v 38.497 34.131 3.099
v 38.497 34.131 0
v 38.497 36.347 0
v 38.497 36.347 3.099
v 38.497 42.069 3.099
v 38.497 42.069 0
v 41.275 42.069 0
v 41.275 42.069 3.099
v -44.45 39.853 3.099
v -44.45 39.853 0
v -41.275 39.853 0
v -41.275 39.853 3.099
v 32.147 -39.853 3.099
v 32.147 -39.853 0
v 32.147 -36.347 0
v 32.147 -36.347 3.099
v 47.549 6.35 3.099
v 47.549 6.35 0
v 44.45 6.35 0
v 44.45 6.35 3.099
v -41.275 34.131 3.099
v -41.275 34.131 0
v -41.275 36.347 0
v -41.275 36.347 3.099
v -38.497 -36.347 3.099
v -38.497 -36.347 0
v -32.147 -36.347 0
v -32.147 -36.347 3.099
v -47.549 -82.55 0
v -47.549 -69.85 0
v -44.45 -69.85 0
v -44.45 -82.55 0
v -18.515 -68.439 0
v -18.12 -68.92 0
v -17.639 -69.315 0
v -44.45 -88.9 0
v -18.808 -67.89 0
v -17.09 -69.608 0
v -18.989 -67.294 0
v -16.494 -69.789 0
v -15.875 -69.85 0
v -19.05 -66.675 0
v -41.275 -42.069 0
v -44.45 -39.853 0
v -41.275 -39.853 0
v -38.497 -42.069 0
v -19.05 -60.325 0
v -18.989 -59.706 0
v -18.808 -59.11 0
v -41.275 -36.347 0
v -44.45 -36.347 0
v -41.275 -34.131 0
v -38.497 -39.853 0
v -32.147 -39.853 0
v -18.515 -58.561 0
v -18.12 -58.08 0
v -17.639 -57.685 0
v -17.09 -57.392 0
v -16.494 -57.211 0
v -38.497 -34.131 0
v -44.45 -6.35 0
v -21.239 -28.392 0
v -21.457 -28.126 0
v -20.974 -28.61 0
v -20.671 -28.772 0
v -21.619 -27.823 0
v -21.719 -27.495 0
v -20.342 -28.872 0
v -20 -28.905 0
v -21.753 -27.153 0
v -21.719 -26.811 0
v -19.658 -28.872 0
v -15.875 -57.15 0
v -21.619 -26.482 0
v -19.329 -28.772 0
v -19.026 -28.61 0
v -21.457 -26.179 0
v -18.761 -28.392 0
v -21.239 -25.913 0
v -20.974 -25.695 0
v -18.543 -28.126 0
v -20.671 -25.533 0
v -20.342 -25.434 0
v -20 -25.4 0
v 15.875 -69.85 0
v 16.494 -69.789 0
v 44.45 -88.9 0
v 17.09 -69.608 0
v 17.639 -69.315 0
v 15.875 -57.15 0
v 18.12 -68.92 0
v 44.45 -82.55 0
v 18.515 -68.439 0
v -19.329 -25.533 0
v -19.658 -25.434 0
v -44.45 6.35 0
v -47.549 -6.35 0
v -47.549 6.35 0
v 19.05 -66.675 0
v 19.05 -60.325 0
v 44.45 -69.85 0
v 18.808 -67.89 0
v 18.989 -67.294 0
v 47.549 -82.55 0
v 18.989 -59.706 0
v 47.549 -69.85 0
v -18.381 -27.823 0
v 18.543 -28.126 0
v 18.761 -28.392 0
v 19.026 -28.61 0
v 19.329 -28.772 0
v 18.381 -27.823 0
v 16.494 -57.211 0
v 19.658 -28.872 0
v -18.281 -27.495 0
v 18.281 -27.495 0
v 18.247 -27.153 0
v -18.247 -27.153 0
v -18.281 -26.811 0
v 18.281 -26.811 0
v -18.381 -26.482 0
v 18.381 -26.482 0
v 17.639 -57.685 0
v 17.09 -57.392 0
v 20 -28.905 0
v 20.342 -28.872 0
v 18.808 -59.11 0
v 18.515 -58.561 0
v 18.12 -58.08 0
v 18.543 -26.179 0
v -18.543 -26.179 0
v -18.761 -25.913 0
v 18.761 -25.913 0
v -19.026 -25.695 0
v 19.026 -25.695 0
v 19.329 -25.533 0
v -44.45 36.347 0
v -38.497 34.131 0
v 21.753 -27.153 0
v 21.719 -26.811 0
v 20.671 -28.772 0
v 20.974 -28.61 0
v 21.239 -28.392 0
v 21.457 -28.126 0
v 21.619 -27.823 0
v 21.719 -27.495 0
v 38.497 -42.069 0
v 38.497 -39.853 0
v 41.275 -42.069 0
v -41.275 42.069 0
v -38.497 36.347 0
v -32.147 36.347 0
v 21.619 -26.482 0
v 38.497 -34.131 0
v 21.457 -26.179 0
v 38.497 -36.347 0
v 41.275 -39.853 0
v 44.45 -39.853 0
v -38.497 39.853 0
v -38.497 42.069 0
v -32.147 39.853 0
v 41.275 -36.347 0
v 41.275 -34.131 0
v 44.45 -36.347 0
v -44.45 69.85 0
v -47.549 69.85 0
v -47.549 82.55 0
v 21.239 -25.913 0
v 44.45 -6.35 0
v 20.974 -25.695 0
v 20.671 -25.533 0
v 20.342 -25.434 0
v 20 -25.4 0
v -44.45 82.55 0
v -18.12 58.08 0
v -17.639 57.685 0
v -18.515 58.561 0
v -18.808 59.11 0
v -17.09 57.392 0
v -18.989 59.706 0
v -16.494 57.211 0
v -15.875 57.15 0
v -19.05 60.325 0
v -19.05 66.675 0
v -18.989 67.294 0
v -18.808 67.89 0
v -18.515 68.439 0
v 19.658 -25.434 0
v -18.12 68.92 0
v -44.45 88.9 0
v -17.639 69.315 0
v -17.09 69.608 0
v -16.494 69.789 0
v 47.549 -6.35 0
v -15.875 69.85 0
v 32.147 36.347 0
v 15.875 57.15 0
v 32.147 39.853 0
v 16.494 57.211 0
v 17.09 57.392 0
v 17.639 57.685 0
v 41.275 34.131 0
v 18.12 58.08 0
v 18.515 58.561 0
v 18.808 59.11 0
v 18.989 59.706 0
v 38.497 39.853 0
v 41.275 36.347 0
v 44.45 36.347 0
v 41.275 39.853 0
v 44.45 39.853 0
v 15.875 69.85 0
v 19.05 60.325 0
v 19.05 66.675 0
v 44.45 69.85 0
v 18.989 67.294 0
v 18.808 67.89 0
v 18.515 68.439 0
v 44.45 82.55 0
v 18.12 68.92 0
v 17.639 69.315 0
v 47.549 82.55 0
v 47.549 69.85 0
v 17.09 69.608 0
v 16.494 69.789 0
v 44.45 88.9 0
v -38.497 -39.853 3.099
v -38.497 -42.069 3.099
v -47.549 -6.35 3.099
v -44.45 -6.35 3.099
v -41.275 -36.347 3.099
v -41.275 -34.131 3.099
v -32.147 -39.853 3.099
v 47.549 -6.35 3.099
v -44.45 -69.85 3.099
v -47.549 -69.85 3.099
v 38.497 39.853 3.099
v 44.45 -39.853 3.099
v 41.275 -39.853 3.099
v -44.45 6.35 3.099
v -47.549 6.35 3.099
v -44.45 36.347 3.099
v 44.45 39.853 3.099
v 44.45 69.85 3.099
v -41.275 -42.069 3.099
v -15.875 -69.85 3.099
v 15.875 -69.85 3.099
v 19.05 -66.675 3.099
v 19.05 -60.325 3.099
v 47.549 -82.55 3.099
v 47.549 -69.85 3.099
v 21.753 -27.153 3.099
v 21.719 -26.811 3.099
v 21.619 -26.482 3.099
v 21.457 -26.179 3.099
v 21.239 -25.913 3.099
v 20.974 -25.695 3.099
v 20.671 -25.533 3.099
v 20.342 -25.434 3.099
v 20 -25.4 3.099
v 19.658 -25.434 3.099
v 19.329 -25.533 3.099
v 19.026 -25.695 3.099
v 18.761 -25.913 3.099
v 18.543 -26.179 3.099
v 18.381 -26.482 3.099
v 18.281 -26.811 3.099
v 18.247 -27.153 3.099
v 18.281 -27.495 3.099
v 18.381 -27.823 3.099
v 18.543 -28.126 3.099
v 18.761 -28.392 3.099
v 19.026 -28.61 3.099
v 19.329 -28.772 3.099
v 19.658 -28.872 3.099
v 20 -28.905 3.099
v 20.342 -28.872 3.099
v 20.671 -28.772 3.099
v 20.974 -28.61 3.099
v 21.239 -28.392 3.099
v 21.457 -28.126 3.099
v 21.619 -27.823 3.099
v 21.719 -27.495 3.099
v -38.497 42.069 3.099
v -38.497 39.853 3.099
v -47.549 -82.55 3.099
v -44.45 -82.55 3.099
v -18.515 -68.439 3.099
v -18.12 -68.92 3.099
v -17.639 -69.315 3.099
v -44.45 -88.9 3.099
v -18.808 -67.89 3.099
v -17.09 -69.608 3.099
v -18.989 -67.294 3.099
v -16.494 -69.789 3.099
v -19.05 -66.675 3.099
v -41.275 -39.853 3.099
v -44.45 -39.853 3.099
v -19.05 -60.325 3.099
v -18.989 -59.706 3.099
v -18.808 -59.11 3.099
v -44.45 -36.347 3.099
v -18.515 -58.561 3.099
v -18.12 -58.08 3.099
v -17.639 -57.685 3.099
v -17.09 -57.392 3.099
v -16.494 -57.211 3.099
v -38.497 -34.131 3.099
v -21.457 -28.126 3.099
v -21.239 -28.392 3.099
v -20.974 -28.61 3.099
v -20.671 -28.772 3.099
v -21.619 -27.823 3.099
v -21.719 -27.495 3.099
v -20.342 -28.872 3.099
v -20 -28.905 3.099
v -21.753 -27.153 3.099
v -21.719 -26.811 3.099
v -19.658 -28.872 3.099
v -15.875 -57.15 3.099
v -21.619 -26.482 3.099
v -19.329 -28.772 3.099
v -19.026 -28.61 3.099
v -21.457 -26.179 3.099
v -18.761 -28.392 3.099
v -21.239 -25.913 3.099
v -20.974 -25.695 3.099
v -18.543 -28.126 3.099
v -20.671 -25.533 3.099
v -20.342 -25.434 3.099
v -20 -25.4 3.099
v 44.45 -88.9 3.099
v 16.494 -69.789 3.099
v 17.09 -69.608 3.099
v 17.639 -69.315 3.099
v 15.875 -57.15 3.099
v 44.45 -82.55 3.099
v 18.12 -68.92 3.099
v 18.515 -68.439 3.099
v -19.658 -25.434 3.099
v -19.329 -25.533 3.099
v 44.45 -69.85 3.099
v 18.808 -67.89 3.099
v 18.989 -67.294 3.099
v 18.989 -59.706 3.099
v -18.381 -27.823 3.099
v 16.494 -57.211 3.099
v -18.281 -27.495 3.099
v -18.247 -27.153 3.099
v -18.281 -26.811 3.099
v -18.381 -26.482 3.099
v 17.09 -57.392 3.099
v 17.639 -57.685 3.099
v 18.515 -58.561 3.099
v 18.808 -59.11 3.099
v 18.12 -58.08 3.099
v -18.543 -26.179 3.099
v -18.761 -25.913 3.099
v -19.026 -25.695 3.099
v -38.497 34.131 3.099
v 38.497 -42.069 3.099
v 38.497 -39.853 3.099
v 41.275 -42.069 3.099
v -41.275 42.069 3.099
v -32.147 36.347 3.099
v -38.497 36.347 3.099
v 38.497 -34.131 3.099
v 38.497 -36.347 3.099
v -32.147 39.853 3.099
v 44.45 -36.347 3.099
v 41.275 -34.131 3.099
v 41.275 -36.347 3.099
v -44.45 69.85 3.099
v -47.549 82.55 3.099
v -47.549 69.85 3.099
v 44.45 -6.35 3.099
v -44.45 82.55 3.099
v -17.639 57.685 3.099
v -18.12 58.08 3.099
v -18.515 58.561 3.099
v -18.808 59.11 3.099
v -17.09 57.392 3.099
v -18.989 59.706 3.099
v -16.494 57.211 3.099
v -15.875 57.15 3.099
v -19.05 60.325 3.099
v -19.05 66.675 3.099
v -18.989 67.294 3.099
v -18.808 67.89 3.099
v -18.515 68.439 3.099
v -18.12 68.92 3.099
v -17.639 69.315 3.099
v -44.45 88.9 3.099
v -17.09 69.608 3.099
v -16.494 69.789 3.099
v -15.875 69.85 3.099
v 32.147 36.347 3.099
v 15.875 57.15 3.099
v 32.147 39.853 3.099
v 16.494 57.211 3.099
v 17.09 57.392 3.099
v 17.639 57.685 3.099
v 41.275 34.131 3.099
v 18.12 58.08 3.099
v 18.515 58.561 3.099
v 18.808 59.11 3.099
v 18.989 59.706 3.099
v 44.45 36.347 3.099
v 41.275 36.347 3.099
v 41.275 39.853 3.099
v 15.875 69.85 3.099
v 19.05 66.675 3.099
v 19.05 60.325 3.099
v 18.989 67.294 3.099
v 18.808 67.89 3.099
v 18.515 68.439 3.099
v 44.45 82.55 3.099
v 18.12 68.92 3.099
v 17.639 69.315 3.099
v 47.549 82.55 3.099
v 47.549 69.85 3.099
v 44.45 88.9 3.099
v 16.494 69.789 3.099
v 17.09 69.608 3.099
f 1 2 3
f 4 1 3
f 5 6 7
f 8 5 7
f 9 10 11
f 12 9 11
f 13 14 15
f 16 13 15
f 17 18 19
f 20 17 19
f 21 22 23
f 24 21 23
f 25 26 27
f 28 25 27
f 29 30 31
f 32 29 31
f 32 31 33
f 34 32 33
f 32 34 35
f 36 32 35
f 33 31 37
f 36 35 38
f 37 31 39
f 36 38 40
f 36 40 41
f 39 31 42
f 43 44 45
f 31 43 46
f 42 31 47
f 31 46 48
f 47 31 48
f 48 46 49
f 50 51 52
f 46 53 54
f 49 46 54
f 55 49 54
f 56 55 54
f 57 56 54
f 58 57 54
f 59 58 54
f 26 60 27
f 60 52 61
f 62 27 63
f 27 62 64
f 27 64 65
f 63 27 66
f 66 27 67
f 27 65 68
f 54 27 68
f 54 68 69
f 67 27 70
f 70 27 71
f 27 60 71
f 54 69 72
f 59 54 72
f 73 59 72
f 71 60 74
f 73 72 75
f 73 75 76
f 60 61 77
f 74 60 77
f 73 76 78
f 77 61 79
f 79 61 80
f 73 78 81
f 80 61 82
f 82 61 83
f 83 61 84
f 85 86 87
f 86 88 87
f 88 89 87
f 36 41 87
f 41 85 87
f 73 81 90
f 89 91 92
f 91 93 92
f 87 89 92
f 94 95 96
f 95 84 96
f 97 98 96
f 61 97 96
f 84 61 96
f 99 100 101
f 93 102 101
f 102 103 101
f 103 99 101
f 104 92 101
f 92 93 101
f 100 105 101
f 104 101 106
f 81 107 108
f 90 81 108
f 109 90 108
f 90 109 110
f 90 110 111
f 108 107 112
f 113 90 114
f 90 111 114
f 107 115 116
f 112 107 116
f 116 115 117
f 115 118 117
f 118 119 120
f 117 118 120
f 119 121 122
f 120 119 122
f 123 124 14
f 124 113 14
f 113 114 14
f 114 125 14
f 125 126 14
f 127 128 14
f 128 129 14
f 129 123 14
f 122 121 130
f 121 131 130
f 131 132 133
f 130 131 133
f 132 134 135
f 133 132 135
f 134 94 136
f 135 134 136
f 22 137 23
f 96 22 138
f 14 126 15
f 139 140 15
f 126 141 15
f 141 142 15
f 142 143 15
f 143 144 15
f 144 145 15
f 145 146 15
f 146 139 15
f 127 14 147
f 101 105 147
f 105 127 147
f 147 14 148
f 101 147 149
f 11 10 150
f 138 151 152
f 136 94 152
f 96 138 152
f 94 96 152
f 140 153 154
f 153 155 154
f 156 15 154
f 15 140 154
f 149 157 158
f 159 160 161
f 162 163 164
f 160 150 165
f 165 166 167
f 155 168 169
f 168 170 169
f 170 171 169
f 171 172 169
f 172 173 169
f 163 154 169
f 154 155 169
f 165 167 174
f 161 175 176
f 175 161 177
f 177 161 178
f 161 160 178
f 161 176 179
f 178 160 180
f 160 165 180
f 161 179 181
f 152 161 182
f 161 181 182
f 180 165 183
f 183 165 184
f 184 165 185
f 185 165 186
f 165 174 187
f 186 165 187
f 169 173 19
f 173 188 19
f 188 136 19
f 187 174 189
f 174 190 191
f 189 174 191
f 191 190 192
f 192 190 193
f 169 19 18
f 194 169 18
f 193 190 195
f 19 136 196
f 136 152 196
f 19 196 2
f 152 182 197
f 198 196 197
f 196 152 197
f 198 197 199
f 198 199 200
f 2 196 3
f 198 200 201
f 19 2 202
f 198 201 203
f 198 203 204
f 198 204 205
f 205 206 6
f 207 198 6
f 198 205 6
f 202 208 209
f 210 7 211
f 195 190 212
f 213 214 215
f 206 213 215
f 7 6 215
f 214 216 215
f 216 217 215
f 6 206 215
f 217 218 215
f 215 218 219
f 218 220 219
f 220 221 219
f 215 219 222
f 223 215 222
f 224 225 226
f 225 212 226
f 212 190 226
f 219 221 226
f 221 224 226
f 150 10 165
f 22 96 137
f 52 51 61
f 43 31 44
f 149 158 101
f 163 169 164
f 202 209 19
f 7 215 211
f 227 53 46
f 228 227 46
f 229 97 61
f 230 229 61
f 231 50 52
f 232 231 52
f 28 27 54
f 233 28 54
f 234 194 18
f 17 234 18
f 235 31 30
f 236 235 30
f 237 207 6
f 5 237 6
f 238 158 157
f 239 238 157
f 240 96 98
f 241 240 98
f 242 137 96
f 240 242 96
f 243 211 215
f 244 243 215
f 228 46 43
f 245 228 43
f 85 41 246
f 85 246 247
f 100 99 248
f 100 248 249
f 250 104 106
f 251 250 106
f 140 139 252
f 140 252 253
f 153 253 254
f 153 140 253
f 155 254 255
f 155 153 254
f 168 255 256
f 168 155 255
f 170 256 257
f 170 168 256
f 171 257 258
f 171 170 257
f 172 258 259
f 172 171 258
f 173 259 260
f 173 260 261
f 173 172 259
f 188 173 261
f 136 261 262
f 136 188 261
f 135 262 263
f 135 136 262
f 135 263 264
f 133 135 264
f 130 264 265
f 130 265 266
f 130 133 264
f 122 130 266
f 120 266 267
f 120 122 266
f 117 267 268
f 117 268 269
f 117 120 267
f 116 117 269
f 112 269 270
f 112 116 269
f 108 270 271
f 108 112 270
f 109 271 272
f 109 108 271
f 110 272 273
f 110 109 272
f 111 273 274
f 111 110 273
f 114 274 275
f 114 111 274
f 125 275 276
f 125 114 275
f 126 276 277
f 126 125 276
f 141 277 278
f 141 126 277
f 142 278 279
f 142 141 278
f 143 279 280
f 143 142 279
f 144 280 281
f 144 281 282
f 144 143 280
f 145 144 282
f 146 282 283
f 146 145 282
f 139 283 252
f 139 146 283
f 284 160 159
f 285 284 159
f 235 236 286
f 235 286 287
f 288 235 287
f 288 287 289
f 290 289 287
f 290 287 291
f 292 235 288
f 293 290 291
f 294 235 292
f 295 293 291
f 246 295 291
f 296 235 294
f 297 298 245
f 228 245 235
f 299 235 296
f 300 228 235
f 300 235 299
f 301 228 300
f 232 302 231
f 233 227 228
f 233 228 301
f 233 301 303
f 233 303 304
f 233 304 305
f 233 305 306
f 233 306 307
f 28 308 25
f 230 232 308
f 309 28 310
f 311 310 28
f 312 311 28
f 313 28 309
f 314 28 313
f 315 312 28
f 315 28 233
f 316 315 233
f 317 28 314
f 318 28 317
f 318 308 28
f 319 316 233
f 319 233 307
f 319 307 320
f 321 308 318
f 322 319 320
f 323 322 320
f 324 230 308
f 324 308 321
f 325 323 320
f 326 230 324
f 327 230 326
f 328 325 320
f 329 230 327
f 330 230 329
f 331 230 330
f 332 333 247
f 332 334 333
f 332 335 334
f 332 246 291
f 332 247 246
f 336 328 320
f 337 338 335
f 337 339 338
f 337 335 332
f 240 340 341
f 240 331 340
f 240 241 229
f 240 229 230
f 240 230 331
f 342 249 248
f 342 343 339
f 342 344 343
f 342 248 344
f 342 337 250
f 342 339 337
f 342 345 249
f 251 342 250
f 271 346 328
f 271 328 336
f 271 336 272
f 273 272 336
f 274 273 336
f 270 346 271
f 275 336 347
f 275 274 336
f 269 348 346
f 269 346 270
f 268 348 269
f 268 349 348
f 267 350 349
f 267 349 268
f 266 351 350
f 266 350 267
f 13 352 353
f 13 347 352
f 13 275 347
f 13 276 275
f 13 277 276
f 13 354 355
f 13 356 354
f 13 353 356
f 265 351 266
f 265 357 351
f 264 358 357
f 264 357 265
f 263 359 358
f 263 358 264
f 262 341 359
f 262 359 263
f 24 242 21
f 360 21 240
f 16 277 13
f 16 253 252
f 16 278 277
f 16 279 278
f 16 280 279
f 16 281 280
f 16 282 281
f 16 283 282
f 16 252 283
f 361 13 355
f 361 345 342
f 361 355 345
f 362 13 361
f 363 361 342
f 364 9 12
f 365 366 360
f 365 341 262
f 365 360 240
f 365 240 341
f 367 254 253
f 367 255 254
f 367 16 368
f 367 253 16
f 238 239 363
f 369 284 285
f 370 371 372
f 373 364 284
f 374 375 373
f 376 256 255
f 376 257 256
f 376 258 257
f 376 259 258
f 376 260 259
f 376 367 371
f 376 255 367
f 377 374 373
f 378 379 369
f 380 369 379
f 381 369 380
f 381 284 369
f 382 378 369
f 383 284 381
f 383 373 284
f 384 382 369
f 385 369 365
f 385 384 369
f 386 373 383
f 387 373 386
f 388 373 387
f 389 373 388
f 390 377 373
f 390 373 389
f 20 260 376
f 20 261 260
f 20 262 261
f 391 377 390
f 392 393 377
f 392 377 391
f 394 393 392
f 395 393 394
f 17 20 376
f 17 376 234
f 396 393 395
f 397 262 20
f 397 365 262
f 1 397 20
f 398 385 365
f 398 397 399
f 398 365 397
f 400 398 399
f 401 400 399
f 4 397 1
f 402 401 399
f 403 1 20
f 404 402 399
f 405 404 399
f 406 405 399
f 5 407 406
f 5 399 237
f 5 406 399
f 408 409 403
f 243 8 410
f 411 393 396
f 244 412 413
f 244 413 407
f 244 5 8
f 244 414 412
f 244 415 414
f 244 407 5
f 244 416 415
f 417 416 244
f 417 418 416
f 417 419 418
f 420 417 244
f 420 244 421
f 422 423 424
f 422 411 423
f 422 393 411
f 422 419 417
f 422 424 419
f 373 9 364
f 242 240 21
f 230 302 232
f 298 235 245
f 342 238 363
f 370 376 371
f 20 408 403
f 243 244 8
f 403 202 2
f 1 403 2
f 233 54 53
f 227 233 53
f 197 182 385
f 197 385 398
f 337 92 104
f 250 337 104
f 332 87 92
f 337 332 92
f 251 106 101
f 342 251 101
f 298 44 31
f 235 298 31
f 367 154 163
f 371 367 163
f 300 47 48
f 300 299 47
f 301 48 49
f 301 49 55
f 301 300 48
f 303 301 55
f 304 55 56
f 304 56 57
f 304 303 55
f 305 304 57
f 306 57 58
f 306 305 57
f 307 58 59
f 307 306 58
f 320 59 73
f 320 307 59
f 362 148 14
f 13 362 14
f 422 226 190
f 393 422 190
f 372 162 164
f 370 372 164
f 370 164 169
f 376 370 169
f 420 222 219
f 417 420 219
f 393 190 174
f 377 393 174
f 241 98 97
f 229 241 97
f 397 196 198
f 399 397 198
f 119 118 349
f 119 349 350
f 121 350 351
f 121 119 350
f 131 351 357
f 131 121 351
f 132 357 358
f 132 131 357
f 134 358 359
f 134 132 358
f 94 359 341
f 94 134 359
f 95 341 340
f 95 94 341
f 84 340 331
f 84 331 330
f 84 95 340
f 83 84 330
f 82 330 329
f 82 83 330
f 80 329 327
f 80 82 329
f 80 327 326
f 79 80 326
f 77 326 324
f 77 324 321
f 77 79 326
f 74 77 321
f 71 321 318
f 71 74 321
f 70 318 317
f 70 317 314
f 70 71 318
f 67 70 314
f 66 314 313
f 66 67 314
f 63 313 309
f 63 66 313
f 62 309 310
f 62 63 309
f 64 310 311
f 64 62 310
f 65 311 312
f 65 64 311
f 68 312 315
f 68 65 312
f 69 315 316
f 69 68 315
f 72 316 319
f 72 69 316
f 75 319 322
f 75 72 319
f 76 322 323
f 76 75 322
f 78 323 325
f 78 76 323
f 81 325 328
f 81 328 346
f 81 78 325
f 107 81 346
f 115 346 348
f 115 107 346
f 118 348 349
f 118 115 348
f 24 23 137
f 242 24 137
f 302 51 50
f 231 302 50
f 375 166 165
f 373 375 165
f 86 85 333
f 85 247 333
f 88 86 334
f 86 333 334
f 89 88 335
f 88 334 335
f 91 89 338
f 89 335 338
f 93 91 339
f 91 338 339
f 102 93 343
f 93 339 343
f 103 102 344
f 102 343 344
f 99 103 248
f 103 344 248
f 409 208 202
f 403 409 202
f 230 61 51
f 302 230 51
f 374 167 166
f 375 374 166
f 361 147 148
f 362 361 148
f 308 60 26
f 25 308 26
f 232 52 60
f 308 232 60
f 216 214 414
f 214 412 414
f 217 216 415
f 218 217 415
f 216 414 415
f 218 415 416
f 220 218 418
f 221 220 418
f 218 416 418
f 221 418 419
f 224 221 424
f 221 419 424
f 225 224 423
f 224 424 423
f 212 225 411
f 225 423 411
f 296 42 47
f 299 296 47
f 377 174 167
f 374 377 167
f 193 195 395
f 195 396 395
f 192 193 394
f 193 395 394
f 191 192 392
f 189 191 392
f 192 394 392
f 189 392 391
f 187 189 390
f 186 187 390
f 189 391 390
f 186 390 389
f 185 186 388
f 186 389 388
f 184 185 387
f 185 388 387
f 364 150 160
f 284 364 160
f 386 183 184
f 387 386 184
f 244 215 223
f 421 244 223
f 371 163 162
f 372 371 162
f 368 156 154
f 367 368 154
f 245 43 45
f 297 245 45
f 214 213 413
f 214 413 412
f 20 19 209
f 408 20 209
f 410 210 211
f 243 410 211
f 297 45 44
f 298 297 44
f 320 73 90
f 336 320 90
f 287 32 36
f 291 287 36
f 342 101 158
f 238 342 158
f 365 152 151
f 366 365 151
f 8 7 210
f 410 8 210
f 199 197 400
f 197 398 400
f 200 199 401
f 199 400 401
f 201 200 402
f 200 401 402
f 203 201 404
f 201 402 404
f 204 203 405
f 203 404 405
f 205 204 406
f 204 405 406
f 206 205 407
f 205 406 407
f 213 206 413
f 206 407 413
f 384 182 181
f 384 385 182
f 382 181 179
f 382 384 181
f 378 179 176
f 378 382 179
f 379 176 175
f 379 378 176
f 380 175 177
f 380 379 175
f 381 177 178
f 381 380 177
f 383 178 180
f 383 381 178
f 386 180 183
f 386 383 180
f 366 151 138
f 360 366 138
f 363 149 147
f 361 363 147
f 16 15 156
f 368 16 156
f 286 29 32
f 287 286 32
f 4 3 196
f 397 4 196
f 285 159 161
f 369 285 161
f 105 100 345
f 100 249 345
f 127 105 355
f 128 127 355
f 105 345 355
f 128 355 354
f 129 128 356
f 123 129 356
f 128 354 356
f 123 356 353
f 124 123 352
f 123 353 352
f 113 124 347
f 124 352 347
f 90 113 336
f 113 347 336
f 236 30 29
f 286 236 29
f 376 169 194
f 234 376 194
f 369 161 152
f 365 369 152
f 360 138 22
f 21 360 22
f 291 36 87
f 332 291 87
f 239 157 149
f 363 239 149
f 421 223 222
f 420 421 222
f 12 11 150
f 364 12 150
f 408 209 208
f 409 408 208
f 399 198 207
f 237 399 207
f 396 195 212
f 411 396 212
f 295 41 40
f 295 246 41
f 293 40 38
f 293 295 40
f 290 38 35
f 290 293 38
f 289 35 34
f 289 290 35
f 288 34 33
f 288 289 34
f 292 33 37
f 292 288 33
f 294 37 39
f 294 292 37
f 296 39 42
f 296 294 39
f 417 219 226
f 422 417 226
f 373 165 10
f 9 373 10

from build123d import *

# Parameters (mm, degrees)
F0_R     = 1.7526
F0_W     = 38.1
F0_H     = 12.7
F1_DEPTH = 3.0988
F2_R     = 3.175


with BuildPart() as f1:
    # F0 (on Top) → F1 (new body)
    with BuildSketch(Plane.XY):
        Polygon((44.45, 88.9), (-44.45, 88.9), (-44.45, 82.55), (-47.5488, 82.55), (-47.5488, 69.85), (-44.45, 69.85), (-44.45, 39.8526), (-41.275, 39.8526), (-41.275, 42.06875), (-38.496875, 42.06875), (-38.496875, 39.8526), (-32.146875, 39.8526), (-32.146875, 36.3474), (-38.496875, 36.3474), (-38.496875, 34.13125), (-41.275, 34.13125), (-41.275, 36.3474), (-44.45, 36.3474), (-44.45, 6.35), (-47.5488, 6.35), (-47.5488, -6.35), (-44.45, -6.35), (-44.45, -36.3474), (-41.275, -36.3474), (-41.275, -34.13125), (-38.496875, -34.13125), (-38.496875, -36.3474), (-32.146875, -36.3474), (-32.146875, -39.8526), (-38.496875, -39.8526), (-38.496875, -42.06875), (-41.275, -42.06875), (-41.275, -39.8526), (-44.45, -39.8526), (-44.45, -69.85), (-47.5488, -69.85), (-47.5488, -82.55), (-44.45, -82.55), (-44.45, -88.9), (44.45, -88.9), (44.45, -82.55), (47.5488, -82.55), (47.5488, -69.85), (44.45, -69.85), (44.45, -39.8526), (41.275, -39.8526), (41.275, -42.06875), (38.496875, -42.06875), (38.496875, -39.8526), (32.146875, -39.8526), (32.146875, -36.3474), (38.496875, -36.3474), (38.496875, -34.13125), (41.275, -34.13125), (41.275, -36.3474), (44.45, -36.3474), (44.45, -6.35), (47.5488, -6.35), (47.5488, 6.35), (44.45, 6.35), (44.45, 36.3474), (41.275, 36.3474), (41.275, 34.13125), (38.496875, 34.13125), (38.496875, 36.3474), (32.146875, 36.3474), (32.146875, 39.8526), (38.496875, 39.8526), (38.496875, 42.06875), (41.275, 42.06875), (41.275, 39.8526), (44.45, 39.8526), (44.45, 69.85), (47.5488, 69.85), (47.5488, 82.55), (44.45, 82.55), align=None)
        with Locations((-20, -27.1526)):
            Circle(F0_R, mode=Mode.SUBTRACT)
        with Locations((0, -63.5)):
            Rectangle(F0_W, F0_H, mode=Mode.SUBTRACT)
        with Locations((20, -27.1526)):
            Circle(F0_R, mode=Mode.SUBTRACT)
        with Locations((0, 63.5)):
            Rectangle(F0_W, F0_H, mode=Mode.SUBTRACT)
    extrude(amount=F1_DEPTH)

    # F2
    f2_edges = [f1.edges().sort_by_distance(p)[0] for p in [
        (19.05, 57.15, 1.5494),
        (19.05, -69.85, 1.5494),
        (-19.05, 57.15, 1.5494),
        (-19.05, -69.85, 1.5494),
        (19.05, 69.85, 1.5494),
        (19.05, -57.15, 1.5494),
        (-19.05, -57.15, 1.5494),
        (-19.05, 69.85, 1.5494),
    ]]
    fillet(f2_edges, radius=F2_R)


solid = f1.part
